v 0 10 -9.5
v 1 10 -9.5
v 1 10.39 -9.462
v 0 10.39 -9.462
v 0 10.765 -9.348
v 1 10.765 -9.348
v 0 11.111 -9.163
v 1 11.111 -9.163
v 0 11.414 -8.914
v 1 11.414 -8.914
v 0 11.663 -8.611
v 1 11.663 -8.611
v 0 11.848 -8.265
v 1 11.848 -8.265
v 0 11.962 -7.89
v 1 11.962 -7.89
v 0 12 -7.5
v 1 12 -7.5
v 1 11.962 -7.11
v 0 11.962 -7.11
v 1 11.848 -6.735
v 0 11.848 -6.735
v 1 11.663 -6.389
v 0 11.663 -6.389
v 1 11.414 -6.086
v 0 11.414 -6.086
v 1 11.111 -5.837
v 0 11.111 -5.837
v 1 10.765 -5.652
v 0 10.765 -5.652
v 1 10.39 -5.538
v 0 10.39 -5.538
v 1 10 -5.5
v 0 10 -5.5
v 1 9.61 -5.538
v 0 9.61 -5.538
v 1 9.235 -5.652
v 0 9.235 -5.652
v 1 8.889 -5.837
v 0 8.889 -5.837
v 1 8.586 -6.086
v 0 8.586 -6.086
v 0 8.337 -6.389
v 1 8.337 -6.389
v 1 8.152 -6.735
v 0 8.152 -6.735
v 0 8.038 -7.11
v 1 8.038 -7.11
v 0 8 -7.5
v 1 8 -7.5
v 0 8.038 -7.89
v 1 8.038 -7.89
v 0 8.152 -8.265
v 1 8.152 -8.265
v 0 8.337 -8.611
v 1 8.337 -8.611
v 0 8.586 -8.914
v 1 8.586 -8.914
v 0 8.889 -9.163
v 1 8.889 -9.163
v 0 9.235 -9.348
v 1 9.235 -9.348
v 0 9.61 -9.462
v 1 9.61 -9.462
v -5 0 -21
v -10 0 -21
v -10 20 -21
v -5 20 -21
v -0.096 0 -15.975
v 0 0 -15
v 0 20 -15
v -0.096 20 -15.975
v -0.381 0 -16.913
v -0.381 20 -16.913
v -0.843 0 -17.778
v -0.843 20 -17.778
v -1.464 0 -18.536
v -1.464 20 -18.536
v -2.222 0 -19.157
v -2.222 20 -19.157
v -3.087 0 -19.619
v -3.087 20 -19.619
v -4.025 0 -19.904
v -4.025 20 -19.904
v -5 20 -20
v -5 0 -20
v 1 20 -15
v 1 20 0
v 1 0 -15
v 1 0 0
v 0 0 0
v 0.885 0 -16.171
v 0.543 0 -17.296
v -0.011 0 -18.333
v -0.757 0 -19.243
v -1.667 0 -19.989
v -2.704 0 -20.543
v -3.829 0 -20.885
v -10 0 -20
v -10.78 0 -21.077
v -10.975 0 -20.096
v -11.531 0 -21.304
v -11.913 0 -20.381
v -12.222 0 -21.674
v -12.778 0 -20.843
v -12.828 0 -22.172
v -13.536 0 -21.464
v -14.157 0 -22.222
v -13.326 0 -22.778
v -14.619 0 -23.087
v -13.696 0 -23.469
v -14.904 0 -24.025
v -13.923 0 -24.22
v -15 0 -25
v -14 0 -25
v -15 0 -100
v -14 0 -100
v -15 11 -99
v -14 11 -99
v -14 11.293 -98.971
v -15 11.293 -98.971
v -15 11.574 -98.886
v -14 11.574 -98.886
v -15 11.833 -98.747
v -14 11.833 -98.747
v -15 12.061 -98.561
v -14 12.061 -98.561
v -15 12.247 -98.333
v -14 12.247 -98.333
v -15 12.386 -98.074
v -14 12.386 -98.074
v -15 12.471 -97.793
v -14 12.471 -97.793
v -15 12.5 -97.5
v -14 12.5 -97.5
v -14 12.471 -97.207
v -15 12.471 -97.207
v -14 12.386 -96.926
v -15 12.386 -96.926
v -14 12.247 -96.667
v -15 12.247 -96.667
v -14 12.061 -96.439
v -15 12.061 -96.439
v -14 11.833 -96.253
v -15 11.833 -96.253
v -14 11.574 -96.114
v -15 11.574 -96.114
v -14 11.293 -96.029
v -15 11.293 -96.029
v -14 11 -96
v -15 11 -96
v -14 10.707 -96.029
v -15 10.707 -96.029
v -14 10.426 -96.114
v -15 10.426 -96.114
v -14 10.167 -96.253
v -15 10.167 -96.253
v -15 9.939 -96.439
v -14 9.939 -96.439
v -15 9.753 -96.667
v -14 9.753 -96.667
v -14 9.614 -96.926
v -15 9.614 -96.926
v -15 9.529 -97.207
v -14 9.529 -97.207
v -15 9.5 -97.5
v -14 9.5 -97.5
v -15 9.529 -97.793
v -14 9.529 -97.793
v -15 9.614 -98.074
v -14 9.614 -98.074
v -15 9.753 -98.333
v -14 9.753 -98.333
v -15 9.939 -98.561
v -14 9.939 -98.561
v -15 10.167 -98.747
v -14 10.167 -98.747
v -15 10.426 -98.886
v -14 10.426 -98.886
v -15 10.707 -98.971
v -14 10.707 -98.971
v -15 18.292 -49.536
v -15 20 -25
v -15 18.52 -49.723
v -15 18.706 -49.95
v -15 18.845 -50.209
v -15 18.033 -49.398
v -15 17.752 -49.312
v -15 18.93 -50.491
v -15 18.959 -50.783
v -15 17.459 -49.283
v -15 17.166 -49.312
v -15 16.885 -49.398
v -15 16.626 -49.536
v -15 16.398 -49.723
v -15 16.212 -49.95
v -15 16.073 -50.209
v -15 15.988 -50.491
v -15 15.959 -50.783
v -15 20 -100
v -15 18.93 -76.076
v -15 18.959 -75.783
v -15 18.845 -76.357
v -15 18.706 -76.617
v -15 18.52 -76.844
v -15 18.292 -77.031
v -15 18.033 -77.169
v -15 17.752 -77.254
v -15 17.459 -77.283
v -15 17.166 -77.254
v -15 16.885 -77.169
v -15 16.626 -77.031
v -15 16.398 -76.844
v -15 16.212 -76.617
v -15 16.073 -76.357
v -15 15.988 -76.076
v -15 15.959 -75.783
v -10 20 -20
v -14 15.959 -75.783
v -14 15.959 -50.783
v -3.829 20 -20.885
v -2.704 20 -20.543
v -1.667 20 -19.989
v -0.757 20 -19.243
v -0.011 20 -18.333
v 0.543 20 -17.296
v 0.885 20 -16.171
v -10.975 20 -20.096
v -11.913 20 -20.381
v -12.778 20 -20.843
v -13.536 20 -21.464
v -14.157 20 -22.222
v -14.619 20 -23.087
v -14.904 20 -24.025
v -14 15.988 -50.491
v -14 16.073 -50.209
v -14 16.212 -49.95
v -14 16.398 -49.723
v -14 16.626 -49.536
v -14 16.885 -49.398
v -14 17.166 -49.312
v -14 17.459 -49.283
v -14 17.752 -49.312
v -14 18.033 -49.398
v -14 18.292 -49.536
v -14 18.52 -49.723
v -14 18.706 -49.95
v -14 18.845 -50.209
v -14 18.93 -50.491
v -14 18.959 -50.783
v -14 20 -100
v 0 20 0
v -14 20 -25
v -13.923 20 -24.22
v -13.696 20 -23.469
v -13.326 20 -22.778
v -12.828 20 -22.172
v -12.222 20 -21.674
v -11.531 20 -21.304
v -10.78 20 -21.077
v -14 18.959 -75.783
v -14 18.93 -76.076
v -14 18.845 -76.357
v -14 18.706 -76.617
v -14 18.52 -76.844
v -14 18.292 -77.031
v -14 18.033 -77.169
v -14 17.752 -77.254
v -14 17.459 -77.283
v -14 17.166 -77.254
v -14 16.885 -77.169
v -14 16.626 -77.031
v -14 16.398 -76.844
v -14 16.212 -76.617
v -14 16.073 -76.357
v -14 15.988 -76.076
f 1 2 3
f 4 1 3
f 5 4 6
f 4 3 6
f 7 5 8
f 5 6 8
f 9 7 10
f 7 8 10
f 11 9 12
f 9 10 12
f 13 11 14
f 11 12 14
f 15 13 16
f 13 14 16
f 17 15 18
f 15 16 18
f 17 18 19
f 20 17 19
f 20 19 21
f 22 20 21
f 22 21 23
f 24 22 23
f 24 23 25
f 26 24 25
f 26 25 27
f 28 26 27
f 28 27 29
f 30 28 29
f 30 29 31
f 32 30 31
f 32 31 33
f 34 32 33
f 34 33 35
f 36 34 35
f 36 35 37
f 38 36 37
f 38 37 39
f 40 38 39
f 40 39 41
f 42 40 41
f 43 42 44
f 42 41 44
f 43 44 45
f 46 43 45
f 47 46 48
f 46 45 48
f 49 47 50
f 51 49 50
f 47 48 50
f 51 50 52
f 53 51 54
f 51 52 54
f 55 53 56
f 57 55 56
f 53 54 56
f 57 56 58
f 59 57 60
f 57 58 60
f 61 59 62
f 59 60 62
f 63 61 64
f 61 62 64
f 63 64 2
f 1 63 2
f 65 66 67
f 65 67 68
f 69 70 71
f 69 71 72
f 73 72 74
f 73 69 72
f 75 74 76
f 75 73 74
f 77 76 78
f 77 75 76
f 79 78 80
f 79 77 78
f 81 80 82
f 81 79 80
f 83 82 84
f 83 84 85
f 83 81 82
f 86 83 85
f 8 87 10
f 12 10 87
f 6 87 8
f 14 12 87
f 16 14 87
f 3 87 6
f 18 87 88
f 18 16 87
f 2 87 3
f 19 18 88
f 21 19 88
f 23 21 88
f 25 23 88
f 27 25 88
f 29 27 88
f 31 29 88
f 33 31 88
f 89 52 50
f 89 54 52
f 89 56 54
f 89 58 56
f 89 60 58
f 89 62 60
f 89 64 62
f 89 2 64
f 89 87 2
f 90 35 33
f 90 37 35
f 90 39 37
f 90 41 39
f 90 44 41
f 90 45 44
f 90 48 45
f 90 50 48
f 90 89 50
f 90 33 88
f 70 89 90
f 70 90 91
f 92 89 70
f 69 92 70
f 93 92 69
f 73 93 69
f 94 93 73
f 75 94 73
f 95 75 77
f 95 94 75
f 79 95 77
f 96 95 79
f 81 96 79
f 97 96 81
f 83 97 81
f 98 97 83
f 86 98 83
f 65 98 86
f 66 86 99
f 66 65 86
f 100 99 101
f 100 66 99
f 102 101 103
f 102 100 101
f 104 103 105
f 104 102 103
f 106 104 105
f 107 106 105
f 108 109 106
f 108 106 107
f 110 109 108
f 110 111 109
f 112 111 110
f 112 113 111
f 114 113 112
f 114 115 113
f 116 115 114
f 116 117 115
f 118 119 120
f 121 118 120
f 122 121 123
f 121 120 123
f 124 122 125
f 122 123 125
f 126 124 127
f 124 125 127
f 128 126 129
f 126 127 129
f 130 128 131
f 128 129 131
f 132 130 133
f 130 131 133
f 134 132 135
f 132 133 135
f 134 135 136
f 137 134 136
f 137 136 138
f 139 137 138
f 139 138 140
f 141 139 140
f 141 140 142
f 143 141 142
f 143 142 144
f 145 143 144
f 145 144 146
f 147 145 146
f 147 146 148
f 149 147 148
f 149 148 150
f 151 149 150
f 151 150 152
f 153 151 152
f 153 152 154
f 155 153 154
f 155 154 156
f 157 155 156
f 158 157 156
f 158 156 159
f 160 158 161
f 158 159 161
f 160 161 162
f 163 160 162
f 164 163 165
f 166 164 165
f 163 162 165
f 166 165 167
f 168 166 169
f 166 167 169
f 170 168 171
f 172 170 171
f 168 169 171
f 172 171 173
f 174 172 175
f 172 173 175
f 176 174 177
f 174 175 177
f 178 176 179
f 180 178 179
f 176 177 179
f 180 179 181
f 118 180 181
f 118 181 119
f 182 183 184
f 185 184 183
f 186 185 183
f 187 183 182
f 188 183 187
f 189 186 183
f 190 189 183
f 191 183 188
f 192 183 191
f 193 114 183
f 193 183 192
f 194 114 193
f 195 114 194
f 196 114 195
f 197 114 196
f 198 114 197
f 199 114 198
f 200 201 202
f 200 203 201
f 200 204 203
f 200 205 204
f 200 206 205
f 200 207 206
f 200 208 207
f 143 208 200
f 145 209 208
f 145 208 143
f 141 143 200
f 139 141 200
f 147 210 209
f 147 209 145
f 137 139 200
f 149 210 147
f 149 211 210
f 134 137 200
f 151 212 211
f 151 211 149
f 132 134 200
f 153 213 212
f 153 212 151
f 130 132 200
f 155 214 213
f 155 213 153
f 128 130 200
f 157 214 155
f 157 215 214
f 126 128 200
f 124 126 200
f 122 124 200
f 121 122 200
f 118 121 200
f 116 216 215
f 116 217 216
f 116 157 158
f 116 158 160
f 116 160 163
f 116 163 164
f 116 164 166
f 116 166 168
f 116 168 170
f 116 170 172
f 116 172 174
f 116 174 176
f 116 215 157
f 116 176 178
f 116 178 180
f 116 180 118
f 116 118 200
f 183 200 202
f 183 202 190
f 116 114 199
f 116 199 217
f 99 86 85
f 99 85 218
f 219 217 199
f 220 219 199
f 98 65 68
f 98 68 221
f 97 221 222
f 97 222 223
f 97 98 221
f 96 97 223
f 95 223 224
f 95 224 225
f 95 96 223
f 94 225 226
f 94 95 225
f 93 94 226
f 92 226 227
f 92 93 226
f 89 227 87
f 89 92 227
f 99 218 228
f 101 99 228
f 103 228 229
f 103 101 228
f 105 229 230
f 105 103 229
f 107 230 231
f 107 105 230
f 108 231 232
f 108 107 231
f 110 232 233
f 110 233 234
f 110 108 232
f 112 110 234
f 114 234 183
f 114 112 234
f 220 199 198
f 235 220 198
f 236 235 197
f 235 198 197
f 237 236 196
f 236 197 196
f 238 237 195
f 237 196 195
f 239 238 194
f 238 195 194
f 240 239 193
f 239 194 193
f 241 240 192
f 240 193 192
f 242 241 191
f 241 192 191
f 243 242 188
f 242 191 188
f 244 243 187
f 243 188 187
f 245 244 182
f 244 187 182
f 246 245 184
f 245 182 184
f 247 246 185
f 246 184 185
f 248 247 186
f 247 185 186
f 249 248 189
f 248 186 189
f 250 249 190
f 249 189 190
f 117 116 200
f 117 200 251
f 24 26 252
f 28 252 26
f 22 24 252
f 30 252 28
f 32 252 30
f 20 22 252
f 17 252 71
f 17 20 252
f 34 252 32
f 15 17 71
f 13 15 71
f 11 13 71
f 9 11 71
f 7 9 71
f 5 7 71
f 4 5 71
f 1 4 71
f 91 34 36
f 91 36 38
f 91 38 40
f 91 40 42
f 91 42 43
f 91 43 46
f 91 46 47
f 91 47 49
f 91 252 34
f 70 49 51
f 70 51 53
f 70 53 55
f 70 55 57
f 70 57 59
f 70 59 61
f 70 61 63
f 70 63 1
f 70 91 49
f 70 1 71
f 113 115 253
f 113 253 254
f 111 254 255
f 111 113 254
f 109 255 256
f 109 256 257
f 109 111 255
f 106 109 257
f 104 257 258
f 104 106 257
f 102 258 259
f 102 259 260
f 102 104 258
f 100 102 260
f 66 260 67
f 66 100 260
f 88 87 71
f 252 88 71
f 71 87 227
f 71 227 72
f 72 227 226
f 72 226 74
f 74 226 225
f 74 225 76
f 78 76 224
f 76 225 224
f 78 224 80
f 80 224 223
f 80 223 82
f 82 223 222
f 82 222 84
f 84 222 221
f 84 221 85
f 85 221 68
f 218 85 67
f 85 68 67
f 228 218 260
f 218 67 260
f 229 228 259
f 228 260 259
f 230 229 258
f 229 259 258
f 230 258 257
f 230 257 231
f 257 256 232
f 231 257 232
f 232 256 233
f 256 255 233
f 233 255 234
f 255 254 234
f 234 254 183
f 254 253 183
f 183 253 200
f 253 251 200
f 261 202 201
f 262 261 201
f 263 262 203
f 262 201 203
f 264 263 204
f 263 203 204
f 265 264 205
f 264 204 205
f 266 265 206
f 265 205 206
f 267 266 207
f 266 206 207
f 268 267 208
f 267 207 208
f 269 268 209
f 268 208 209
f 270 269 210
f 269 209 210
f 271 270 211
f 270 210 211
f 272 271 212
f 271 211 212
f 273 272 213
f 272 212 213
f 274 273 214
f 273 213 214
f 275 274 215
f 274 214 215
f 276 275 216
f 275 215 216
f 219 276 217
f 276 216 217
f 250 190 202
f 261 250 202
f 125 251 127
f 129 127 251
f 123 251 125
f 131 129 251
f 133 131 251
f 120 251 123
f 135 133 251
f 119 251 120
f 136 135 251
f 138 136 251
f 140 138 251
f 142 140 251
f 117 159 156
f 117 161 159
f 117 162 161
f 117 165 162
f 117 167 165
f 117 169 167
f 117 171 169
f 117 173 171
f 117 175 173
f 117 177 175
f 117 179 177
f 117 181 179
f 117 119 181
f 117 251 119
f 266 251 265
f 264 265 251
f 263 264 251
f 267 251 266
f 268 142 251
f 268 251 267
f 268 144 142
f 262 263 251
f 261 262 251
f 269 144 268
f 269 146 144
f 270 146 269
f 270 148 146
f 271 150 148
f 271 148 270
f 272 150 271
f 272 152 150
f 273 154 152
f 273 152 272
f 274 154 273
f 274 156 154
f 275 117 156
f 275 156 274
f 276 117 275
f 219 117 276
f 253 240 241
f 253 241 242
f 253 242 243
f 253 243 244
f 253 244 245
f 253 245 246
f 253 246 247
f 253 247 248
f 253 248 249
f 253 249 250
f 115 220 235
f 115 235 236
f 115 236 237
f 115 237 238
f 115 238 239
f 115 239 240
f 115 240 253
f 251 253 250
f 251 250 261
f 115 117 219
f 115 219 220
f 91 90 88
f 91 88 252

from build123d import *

# Parameters (mm, degrees)
EXTRUDE_THIN1_DEPTH = 20
SKETCH2_R           = 2
CUT_EXTRUDE1_DEPTH  = 17
SKETCH3_R           = 1.5
CUT_EXTRUDE2_DEPTH  = 2
CUT_EXTRUDE3_DEPTH  = 17


with BuildPart() as part:
    # Sketch1 → Extrude-Thin1 (new body)
    with BuildSketch(Plane(origin=(0, 0, 0), x_dir=(1, 0, 0), z_dir=(0, 1, 0))):
        with BuildLine():
            Line((0, 0), (0, 15))
            ThreePointArc((0, 15), (-1.464466094, 18.535533906), (-5, 20))
            Line((-5, 20), (-10, 20))
            ThreePointArc((-10, 20), (-13.535533906, 21.464466094), (-15, 25))
            Line((-15, 25), (-15, 100))
            Line((-15, 100), (-14, 100))
            Line((-14, 100), (-14, 25))
            ThreePointArc((-14, 25), (-12.828427125, 22.171572875), (-10, 21))
            Line((-10, 21), (-5, 21))
            ThreePointArc((-5, 21), (-0.757359313, 19.242640687), (1, 15))
            Line((1, 15), (1, 0))
            Line((1, 0), (0, 0))
        make_face()
    extrude(amount=EXTRUDE_THIN1_DEPTH)

    # Sketch2 → Cut-Extrude1 (cut, through all)
    with BuildSketch(Plane(origin=(1, 0, 0), x_dir=(0, 0, -1), z_dir=(1, 0, 0))):
        with Locations((7.5, 10)):
            Circle(SKETCH2_R)
    extrude(amount=-CUT_EXTRUDE1_DEPTH, mode=Mode.SUBTRACT)

    # Sketch3 → Cut-Extrude2 (cut, through all)
    with BuildSketch(Plane(origin=(-14, 0, 0), x_dir=(0, 0, -1), z_dir=(1, 0, 0))):
        with Locations((97.5, 11)):
            Circle(SKETCH3_R)
    extrude(amount=-CUT_EXTRUDE2_DEPTH, mode=Mode.SUBTRACT)

    # Sketch4 → Cut-Extrude3 (cut, through all)
    with BuildSketch(Plane.ZY.offset(15)):
        with BuildLine():
            Line((-50.783321534, 18.959123293), (-75.783321534, 18.959123293))
            ThreePointArc((-75.783321534, 18.959123293), (-77.283321534, 17.459123293), (-75.783321534, 15.959123293))
            Line((-75.783321534, 15.959123293), (-50.783321534, 15.959123293))
            ThreePointArc((-50.783321534, 15.959123293), (-49.283321534, 17.459123293), (-50.783321534, 18.959123293))
        make_face()
    extrude(amount=-CUT_EXTRUDE3_DEPTH, mode=Mode.SUBTRACT)


solid = part.part
